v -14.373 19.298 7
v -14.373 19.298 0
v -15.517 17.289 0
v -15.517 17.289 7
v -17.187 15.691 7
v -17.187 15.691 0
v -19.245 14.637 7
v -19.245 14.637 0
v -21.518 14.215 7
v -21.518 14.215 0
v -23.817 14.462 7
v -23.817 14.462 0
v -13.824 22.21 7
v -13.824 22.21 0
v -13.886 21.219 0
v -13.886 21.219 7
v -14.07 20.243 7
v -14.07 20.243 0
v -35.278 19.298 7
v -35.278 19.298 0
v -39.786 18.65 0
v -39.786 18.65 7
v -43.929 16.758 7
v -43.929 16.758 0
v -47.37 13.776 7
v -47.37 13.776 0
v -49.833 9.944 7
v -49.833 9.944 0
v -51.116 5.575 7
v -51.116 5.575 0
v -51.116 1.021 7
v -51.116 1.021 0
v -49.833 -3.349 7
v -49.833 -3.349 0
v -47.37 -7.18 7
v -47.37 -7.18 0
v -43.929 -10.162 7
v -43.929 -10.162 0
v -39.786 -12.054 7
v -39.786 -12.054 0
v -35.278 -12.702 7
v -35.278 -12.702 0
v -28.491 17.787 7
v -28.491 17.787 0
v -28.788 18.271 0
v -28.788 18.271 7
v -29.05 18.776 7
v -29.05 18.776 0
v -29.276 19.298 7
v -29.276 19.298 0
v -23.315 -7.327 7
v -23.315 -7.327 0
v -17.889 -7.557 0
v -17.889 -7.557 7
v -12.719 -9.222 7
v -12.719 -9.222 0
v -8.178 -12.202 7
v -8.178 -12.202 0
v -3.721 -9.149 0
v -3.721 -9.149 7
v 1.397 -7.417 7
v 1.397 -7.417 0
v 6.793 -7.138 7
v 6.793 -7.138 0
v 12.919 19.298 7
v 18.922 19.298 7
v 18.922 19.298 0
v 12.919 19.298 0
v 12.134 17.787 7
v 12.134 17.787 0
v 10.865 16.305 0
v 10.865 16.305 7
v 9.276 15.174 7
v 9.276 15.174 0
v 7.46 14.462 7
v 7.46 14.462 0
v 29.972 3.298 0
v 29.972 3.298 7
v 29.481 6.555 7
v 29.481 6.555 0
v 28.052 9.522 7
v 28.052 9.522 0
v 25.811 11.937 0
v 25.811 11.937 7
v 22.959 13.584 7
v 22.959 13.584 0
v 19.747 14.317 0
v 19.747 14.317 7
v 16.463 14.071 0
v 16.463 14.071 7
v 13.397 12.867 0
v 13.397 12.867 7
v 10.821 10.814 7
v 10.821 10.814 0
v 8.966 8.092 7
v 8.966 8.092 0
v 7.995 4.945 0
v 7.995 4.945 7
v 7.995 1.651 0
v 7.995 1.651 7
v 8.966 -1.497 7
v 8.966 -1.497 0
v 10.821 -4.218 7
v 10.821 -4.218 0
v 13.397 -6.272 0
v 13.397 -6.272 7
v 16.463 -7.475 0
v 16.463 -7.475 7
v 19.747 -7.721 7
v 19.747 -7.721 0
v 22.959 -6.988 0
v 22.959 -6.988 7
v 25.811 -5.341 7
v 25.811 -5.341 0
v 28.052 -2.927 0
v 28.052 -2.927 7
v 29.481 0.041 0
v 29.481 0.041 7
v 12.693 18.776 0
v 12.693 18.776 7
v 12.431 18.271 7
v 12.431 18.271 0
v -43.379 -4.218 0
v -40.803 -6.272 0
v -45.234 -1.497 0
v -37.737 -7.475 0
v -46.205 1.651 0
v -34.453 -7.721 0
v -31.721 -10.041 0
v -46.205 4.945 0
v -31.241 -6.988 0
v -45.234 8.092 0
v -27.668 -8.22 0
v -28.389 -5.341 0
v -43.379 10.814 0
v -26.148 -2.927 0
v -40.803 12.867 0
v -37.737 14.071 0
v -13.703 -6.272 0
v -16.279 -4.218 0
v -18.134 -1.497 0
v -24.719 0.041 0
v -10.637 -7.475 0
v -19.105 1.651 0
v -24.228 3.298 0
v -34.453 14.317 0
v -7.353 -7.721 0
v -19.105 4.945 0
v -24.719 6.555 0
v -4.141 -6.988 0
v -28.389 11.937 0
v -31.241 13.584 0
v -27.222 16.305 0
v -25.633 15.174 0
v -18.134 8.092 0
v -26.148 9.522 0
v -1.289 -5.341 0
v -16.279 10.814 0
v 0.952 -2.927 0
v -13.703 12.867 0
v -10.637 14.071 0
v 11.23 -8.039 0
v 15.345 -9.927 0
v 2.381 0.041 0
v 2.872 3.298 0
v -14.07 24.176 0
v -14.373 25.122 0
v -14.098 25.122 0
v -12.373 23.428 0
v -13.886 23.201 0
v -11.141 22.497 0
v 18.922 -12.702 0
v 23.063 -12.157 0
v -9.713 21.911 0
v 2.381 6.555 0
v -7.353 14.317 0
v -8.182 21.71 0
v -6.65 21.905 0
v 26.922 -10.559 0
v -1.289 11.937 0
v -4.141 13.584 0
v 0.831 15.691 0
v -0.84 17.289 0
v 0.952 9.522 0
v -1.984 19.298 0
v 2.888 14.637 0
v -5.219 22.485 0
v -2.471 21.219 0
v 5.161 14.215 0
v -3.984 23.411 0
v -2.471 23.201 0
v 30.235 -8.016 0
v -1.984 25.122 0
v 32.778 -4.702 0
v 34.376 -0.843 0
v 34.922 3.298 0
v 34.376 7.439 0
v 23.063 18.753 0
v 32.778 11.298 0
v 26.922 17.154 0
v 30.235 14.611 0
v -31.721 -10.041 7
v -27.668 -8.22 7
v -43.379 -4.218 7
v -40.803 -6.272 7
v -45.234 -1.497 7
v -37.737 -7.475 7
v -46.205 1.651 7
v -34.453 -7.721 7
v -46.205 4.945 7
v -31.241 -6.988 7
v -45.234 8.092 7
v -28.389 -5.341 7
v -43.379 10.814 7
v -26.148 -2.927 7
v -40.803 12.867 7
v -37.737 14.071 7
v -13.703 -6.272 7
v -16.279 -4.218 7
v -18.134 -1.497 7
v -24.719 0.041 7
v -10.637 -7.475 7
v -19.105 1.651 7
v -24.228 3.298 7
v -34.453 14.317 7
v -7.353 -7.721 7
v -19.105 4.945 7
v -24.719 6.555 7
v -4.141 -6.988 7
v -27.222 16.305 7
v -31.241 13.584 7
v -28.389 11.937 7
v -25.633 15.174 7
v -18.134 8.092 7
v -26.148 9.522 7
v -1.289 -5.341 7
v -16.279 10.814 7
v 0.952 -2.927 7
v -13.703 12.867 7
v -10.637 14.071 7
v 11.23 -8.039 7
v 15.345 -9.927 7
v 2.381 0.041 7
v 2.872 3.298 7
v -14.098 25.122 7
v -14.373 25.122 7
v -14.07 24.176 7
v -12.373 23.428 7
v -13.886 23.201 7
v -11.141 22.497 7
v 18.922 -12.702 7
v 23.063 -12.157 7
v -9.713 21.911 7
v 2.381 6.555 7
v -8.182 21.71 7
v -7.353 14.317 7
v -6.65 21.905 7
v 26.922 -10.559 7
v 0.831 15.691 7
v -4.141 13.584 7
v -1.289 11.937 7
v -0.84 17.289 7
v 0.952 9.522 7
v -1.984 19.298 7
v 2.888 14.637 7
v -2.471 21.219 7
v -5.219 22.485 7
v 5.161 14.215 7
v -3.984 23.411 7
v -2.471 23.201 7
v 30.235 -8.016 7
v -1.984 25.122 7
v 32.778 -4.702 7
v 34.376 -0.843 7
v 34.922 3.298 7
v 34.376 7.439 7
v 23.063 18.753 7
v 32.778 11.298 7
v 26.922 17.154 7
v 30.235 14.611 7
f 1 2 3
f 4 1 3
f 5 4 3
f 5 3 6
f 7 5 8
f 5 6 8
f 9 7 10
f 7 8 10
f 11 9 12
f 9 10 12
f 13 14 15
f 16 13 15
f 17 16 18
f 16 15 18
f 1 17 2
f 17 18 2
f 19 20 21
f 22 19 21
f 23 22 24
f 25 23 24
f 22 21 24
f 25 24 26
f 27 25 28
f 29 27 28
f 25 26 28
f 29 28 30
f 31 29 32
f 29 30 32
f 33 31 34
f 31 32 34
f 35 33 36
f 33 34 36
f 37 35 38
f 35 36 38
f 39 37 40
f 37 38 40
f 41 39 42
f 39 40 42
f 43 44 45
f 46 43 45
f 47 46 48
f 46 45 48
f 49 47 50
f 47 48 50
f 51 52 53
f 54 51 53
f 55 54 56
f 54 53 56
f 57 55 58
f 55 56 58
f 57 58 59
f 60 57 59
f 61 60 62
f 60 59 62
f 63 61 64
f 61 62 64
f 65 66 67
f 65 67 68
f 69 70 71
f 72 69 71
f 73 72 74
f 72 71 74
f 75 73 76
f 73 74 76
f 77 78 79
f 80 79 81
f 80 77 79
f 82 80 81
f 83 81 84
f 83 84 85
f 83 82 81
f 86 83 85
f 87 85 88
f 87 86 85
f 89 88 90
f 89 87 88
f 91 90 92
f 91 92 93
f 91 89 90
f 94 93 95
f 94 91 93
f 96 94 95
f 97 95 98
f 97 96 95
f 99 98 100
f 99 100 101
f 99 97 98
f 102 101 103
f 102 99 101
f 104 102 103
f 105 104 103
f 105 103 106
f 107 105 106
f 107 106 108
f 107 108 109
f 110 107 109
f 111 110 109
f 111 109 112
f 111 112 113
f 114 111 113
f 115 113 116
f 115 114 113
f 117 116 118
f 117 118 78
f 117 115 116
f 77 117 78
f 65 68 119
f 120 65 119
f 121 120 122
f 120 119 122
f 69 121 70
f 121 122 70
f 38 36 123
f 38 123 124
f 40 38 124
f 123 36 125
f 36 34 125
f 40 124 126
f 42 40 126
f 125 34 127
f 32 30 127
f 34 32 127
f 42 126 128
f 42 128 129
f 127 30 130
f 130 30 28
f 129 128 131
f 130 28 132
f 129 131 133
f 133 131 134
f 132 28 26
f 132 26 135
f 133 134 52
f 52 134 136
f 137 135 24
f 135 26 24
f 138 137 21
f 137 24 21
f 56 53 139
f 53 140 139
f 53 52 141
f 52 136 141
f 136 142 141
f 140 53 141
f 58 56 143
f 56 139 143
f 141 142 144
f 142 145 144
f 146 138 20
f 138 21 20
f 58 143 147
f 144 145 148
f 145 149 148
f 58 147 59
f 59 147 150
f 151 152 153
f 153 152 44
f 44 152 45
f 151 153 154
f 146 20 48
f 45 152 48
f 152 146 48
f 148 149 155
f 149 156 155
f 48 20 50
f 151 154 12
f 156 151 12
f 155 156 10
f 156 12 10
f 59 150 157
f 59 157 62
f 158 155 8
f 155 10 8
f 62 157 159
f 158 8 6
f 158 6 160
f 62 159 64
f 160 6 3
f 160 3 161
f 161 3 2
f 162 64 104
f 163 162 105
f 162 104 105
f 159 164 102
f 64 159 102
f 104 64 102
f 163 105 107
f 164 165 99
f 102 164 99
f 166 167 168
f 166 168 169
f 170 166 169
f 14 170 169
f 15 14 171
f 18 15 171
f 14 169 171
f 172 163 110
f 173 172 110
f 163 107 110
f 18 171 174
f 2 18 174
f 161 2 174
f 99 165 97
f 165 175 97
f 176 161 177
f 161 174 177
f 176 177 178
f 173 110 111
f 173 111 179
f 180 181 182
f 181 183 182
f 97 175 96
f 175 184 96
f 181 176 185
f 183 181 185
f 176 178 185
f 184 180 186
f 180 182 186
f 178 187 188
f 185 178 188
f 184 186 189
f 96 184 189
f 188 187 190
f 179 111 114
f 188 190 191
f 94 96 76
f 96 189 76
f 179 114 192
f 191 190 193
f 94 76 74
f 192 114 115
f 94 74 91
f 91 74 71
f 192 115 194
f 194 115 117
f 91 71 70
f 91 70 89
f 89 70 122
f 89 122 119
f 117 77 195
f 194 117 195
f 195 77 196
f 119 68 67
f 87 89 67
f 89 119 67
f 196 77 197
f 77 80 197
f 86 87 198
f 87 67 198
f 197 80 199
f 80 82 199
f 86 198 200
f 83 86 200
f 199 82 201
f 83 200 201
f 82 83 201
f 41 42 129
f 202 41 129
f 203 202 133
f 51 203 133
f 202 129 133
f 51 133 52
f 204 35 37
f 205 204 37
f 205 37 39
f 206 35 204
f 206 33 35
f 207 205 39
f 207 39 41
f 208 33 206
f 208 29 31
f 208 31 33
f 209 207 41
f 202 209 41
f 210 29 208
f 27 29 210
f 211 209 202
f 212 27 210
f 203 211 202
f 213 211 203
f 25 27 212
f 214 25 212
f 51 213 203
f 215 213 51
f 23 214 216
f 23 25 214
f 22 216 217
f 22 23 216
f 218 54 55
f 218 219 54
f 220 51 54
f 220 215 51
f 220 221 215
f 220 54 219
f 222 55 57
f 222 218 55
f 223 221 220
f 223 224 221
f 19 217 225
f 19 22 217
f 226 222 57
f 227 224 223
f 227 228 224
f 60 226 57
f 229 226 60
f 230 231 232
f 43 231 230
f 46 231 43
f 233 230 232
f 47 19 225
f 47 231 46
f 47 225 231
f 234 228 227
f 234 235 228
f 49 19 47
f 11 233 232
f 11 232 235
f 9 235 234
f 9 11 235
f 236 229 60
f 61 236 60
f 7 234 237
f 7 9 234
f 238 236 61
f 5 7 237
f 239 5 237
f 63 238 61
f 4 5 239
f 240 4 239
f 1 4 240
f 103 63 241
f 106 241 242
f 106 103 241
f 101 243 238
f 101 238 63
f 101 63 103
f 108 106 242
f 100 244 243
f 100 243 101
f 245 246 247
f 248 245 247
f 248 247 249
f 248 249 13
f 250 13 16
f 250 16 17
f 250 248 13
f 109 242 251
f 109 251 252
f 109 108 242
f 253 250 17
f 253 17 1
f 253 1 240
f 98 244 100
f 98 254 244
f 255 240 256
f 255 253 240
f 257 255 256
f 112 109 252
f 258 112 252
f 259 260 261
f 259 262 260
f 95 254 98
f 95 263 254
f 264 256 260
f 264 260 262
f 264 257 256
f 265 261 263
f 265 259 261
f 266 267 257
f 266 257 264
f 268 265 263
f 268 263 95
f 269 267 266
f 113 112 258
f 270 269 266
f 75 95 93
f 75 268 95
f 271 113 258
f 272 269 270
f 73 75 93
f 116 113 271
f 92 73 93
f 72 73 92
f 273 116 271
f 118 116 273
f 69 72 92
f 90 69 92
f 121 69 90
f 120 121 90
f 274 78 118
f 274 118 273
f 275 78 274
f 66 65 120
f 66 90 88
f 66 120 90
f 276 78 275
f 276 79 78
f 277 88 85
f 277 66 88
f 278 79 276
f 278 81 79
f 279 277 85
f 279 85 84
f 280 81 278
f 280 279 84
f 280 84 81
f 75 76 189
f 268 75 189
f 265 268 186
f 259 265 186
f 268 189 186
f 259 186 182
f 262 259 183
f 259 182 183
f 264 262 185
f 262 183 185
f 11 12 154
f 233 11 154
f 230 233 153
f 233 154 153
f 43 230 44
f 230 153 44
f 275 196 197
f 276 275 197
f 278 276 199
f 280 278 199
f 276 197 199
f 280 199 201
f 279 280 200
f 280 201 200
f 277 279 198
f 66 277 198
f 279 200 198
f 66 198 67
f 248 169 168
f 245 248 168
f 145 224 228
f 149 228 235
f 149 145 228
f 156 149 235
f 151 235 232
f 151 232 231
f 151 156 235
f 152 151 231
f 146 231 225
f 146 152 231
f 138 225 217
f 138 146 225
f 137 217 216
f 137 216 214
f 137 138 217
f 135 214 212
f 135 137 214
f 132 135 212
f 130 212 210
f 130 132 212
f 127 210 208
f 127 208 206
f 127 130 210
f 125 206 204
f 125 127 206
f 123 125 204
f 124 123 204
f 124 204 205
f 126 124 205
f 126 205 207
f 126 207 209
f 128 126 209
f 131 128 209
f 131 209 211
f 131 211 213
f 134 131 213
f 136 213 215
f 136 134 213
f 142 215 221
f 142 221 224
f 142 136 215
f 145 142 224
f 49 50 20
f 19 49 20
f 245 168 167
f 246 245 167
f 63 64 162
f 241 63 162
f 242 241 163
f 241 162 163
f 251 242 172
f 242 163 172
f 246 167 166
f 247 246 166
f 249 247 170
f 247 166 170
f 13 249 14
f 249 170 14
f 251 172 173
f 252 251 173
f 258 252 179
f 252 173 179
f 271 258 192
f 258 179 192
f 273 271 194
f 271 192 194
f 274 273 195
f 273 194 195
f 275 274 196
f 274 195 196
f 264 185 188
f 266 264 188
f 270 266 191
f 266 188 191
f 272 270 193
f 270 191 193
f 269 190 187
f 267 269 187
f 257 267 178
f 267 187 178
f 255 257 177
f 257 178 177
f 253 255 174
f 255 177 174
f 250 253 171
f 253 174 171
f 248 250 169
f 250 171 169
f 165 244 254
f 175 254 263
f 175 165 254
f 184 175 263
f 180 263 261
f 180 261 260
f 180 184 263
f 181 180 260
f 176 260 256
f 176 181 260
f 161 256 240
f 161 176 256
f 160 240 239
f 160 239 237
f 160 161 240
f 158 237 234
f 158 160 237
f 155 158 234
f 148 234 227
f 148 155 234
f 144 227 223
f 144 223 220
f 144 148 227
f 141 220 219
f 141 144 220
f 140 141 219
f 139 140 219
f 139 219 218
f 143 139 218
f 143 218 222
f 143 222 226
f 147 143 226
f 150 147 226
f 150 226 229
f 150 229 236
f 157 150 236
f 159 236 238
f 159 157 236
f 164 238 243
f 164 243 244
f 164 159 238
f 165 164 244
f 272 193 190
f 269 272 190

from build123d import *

# Parameters (mm, degrees)
F0_R     = 11.05
F1_DEPTH = 7


# Not quite as in the source:
# - a feature names something its author has since deleted; it is built from what else it names


with BuildPart() as f1:
    # F0 (on Top) → F1 (new body)
    with BuildSketch(Plane.XY):
        with BuildLine():
            ThreePointArc((-19.2783924252, 3.2977389637), (-20.321649546, -2.3852041509), (-23.3153727308, -7.3270509067))
            ThreePointArc((-23.3153727308, -7.3270509067), (-15.247882117, -8.2153155431), (-8.1783924252, -12.2022610363))
            ThreePointArc((-8.1783924252, -12.2022610363), (-1.221278488, -8.1070481694), (6.7932734583, -7.1379455637))
            ThreePointArc((6.7932734583, -7.1379455637), (2.9292273158, 3.7914733565), (7.4601219716, 14.4617144101))
            ThreePointArc((7.4601219716, 14.4617144101), (1.8212672524, 15.0889872554), (-1.9835406039, 19.2977389637))
            Line((-1.9835406039, 19.2977389637), (-14.3732442464, 19.2977389637))
            ThreePointArc((-14.3732442464, 19.2977389637), (-18.1780521028, 15.0889872554), (-23.816906822, 14.4617144101))
            ThreePointArc((-23.816906822, 14.4617144101), (-20.4563856506, 9.3233605229), (-19.2783924252, 3.2977389637))
        make_face()
        with Locations((-8.1783924252, 3.2977389637)):
            Circle(F0_R, mode=Mode.SUBTRACT)
        with BuildLine():
            ThreePointArc((-28.490516072, 17.7865185747), (-31.8013587595, 18.915364804), (-35.2783924252, 19.2977389637))
            ThreePointArc((-35.2783924252, 19.2977389637), (-51.2783924252, 3.2977389637), (-35.2783924252, -12.7022610363))
            ThreePointArc((-35.2783924252, -12.7022610363), (-29.74444778, -9.0185588521), (-23.3153727308, -7.3270509067))
            ThreePointArc((-23.3153727308, -7.3270509067), (-20.321649546, -2.3852041509), (-19.2783924252, 3.2977389637))
            ThreePointArc((-19.2783924252, 3.2977389637), (-20.4563856506, 9.3233605229), (-23.816906822, 14.4617144101))
            ThreePointArc((-23.816906822, 14.4617144101), (-26.4619172405, 15.6908779087), (-28.490516072, 17.7865185747))
        make_face()
        with Locations((-35.2783924252, 3.2977389637)):
            Circle(F0_R, mode=Mode.SUBTRACT)
        with BuildLine():
            ThreePointArc((7.4601219716, 14.4617144101), (2.9292273158, 3.7914733565), (6.7932734583, -7.1379455637))
            ThreePointArc((6.7932734583, -7.1379455637), (13.3416443494, -8.8647019853), (18.9216075748, -12.7022610363))
            ThreePointArc((18.9216075748, -12.7022610363), (30.2353160738, -8.0159695352), (34.9216075748, 3.2977389637))
            ThreePointArc((34.9216075748, 3.2977389637), (30.2353160738, 14.6114474627), (18.9216075748, 19.2977389637))
            ThreePointArc((18.9216075748, 19.2977389637), (15.4445739091, 18.915364804), (12.1337312216, 17.7865185747))
            ThreePointArc((12.1337312216, 17.7865185747), (10.1051323901, 15.6908779087), (7.4601219716, 14.4617144101))
        make_face()
        with Locations((18.9216075748, 3.2977389637)):
            Circle(F0_R, mode=Mode.SUBTRACT)
        with BuildLine():
            Line((-29.2757110635, 19.2977389637), (-35.2783924252, 19.2977389637))
            ThreePointArc((-35.2783924252, 19.2977389637), (-31.8013587595, 18.915364804), (-28.490516072, 17.7865185747))
            ThreePointArc((-28.490516072, 17.7865185747), (-28.923441503, 18.5211753113), (-29.2757110635, 19.2977389637))
        make_face()
        with BuildLine():
            Line((18.9216075748, 19.2977389637), (12.9189262131, 19.2977389637))
            ThreePointArc((12.9189262131, 19.2977389637), (12.5666566526, 18.5211753113), (12.1337312216, 17.7865185747))
            ThreePointArc((12.1337312216, 17.7865185747), (15.4445739091, 18.915364804), (18.9216075748, 19.2977389637))
        make_face()
        with BuildLine():
            ThreePointArc((-13.824477655, 22.2096319377), (-13.9628662658, 20.7280563015), (-14.3732442464, 19.2977389637))
            Line((-14.3732442464, 19.2977389637), (-1.9835406039, 19.2977389637))
            ThreePointArc((-1.9835406039, 19.2977389637), (-2.5323071954, 22.2096319377), (-1.9835406039, 25.1215249117))
            Line((-1.9835406039, 25.1215249117), (-3.9835406039, 23.4114221363))
            ThreePointArc((-3.9835406039, 23.4114221363), (-8.1817639697, 21.709585029), (-12.3732442464, 23.4279627693))
            Line((-12.3732442464, 23.4279627693), (-14.0983548132, 25.1215249117))
            Line((-14.0983548132, 25.1215249117), (-14.3732442464, 25.1215249117))
            ThreePointArc((-14.3732442464, 25.1215249117), (-13.9628662658, 23.691207574), (-13.824477655, 22.2096319377))
        make_face()
    extrude(amount=F1_DEPTH)


solid = f1.part
